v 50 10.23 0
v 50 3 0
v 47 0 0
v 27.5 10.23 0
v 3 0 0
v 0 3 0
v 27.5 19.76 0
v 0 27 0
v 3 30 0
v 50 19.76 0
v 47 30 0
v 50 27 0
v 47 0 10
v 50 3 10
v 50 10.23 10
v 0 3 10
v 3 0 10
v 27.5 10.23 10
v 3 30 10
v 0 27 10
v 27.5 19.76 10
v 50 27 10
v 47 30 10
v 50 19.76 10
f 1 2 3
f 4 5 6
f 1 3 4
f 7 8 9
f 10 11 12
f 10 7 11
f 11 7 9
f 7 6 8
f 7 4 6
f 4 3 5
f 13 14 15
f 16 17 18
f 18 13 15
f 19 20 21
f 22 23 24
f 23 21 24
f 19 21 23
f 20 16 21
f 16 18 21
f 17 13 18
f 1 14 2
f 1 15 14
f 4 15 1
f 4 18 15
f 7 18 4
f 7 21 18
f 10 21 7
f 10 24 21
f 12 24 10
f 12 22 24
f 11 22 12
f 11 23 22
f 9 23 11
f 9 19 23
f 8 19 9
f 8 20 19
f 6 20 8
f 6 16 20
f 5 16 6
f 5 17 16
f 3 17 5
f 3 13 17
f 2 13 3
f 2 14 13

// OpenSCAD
$fn = 32;

// ----------------------------------------------------------------------
// C washer: 50 x 30 mm plate with an open slot
// ----------------------------------------------------------------------

// --- parameters (mm) ---
profile_height = 10;      // extrusion height
profile_points = 12;      // points of the closed outline

profile = [[3, 0], [47, 0], [50, 3], [50, 10.23], [27.5, 10.23], [27.5, 19.76], [50, 19.76], [50, 27], [47, 30], [3, 30], [0, 27], [0, 3]];  // single closed polygon, 12 points, counter clockwise

// --- the one profile operation ---
linear_extrude(height = profile_height) polygon(points = profile);
